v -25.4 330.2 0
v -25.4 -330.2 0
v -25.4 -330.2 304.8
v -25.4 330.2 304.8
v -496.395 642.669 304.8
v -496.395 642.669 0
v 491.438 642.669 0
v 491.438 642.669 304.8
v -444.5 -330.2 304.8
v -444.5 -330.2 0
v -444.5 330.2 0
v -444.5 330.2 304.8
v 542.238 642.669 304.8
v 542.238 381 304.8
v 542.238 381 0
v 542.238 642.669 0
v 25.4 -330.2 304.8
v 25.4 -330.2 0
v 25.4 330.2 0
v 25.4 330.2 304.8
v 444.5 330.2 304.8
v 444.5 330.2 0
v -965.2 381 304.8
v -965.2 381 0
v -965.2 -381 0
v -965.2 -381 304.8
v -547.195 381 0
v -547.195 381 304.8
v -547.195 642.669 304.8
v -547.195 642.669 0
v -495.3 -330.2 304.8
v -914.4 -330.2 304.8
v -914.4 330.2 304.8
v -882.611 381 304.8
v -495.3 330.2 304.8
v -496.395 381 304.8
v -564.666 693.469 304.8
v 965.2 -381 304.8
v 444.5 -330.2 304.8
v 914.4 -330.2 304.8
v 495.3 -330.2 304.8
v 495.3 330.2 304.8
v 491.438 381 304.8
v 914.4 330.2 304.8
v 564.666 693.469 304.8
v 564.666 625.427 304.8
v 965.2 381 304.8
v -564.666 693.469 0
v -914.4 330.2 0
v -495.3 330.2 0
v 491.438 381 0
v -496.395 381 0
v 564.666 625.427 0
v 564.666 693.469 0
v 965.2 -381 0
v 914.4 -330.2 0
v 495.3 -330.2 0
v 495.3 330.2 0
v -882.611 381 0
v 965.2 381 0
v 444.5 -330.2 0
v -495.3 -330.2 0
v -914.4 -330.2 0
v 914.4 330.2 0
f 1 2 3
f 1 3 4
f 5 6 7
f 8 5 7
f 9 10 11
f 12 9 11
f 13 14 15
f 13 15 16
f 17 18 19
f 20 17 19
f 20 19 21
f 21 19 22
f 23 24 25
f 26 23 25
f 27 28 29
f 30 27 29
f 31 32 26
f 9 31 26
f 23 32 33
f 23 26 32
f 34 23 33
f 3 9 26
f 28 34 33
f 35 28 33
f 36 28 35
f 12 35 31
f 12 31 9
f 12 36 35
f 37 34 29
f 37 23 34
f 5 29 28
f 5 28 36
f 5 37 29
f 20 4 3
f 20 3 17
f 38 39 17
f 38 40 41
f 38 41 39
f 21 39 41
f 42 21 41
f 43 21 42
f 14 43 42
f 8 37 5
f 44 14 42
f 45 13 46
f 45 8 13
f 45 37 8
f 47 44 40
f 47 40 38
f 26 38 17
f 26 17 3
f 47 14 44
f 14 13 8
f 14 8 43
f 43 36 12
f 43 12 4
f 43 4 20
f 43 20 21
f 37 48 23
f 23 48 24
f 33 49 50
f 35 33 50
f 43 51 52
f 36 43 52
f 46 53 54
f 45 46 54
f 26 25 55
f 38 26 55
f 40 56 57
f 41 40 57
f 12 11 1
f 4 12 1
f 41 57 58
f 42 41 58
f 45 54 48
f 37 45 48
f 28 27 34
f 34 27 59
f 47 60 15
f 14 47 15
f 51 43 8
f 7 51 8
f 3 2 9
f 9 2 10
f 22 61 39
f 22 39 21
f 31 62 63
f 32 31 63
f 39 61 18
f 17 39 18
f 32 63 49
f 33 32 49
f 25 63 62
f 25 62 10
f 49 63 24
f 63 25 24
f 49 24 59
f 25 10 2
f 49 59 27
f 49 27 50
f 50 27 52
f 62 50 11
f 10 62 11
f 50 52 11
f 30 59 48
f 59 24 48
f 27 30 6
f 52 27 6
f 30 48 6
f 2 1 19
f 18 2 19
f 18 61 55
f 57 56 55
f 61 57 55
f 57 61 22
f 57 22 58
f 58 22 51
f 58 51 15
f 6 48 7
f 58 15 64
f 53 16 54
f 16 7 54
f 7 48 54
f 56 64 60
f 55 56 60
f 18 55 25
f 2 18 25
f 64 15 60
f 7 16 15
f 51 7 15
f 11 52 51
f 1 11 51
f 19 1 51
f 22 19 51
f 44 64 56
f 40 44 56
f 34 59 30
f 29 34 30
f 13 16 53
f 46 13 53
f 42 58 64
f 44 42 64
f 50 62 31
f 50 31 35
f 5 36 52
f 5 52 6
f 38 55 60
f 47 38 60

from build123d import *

# Parameters (mm, degrees)
F0_W     = 50.8
F0_H     = 261.669054
F0_H_2   = 660.4
F1_DEPTH = 304.8


with BuildPart() as f1:
    # F0 (on Top) → F1 (new body)
    with BuildSketch(Plane.XY):
        Polygon((564.666493, 625.426641), (564.666493, 693.469054), (-564.666493, 693.469054), (-965.2, 381), (-882.611341, 381), (-547.19501, 642.669054), (-496.39501, 642.669054), (491.437937, 642.669054), (542.237937, 642.669054), align=None)
        with Locations((-521.79501, 511.834527)):
            Rectangle(F0_W, F0_H)
        with Locations((516.837937, 511.834527)):
            Rectangle(F0_W, F0_H)
        Polygon((965.2, -381), (965.2, 381), (882.611341, 381), (542.237937, 381), (491.437937, 381), (-496.39501, 381), (-547.19501, 381), (-882.611341, 381), (-965.2, 381), (-965.2, -381), align=None)
        Polygon((495.3, 330.2), (914.4, 330.2), (914.4, -330.2), (495.3, -330.2), (444.5, -330.2), (25.4, -330.2), (-25.4, -330.2), (-444.5, -330.2), (-495.3, -330.2), (-914.4, -330.2), (-914.4, 330.2), (-495.3, 330.2), (-444.5, 330.2), (-25.4, 330.2), (25.4, 330.2), (444.5, 330.2), align=None, mode=Mode.SUBTRACT)
        with Locations((469.9, 0)):
            Rectangle(F0_W, F0_H_2)
        Rectangle(F0_W, F0_H_2)
        with Locations((-469.9, 0)):
            Rectangle(F0_W, F0_H_2)
    extrude(amount=F1_DEPTH)


solid = f1.part
